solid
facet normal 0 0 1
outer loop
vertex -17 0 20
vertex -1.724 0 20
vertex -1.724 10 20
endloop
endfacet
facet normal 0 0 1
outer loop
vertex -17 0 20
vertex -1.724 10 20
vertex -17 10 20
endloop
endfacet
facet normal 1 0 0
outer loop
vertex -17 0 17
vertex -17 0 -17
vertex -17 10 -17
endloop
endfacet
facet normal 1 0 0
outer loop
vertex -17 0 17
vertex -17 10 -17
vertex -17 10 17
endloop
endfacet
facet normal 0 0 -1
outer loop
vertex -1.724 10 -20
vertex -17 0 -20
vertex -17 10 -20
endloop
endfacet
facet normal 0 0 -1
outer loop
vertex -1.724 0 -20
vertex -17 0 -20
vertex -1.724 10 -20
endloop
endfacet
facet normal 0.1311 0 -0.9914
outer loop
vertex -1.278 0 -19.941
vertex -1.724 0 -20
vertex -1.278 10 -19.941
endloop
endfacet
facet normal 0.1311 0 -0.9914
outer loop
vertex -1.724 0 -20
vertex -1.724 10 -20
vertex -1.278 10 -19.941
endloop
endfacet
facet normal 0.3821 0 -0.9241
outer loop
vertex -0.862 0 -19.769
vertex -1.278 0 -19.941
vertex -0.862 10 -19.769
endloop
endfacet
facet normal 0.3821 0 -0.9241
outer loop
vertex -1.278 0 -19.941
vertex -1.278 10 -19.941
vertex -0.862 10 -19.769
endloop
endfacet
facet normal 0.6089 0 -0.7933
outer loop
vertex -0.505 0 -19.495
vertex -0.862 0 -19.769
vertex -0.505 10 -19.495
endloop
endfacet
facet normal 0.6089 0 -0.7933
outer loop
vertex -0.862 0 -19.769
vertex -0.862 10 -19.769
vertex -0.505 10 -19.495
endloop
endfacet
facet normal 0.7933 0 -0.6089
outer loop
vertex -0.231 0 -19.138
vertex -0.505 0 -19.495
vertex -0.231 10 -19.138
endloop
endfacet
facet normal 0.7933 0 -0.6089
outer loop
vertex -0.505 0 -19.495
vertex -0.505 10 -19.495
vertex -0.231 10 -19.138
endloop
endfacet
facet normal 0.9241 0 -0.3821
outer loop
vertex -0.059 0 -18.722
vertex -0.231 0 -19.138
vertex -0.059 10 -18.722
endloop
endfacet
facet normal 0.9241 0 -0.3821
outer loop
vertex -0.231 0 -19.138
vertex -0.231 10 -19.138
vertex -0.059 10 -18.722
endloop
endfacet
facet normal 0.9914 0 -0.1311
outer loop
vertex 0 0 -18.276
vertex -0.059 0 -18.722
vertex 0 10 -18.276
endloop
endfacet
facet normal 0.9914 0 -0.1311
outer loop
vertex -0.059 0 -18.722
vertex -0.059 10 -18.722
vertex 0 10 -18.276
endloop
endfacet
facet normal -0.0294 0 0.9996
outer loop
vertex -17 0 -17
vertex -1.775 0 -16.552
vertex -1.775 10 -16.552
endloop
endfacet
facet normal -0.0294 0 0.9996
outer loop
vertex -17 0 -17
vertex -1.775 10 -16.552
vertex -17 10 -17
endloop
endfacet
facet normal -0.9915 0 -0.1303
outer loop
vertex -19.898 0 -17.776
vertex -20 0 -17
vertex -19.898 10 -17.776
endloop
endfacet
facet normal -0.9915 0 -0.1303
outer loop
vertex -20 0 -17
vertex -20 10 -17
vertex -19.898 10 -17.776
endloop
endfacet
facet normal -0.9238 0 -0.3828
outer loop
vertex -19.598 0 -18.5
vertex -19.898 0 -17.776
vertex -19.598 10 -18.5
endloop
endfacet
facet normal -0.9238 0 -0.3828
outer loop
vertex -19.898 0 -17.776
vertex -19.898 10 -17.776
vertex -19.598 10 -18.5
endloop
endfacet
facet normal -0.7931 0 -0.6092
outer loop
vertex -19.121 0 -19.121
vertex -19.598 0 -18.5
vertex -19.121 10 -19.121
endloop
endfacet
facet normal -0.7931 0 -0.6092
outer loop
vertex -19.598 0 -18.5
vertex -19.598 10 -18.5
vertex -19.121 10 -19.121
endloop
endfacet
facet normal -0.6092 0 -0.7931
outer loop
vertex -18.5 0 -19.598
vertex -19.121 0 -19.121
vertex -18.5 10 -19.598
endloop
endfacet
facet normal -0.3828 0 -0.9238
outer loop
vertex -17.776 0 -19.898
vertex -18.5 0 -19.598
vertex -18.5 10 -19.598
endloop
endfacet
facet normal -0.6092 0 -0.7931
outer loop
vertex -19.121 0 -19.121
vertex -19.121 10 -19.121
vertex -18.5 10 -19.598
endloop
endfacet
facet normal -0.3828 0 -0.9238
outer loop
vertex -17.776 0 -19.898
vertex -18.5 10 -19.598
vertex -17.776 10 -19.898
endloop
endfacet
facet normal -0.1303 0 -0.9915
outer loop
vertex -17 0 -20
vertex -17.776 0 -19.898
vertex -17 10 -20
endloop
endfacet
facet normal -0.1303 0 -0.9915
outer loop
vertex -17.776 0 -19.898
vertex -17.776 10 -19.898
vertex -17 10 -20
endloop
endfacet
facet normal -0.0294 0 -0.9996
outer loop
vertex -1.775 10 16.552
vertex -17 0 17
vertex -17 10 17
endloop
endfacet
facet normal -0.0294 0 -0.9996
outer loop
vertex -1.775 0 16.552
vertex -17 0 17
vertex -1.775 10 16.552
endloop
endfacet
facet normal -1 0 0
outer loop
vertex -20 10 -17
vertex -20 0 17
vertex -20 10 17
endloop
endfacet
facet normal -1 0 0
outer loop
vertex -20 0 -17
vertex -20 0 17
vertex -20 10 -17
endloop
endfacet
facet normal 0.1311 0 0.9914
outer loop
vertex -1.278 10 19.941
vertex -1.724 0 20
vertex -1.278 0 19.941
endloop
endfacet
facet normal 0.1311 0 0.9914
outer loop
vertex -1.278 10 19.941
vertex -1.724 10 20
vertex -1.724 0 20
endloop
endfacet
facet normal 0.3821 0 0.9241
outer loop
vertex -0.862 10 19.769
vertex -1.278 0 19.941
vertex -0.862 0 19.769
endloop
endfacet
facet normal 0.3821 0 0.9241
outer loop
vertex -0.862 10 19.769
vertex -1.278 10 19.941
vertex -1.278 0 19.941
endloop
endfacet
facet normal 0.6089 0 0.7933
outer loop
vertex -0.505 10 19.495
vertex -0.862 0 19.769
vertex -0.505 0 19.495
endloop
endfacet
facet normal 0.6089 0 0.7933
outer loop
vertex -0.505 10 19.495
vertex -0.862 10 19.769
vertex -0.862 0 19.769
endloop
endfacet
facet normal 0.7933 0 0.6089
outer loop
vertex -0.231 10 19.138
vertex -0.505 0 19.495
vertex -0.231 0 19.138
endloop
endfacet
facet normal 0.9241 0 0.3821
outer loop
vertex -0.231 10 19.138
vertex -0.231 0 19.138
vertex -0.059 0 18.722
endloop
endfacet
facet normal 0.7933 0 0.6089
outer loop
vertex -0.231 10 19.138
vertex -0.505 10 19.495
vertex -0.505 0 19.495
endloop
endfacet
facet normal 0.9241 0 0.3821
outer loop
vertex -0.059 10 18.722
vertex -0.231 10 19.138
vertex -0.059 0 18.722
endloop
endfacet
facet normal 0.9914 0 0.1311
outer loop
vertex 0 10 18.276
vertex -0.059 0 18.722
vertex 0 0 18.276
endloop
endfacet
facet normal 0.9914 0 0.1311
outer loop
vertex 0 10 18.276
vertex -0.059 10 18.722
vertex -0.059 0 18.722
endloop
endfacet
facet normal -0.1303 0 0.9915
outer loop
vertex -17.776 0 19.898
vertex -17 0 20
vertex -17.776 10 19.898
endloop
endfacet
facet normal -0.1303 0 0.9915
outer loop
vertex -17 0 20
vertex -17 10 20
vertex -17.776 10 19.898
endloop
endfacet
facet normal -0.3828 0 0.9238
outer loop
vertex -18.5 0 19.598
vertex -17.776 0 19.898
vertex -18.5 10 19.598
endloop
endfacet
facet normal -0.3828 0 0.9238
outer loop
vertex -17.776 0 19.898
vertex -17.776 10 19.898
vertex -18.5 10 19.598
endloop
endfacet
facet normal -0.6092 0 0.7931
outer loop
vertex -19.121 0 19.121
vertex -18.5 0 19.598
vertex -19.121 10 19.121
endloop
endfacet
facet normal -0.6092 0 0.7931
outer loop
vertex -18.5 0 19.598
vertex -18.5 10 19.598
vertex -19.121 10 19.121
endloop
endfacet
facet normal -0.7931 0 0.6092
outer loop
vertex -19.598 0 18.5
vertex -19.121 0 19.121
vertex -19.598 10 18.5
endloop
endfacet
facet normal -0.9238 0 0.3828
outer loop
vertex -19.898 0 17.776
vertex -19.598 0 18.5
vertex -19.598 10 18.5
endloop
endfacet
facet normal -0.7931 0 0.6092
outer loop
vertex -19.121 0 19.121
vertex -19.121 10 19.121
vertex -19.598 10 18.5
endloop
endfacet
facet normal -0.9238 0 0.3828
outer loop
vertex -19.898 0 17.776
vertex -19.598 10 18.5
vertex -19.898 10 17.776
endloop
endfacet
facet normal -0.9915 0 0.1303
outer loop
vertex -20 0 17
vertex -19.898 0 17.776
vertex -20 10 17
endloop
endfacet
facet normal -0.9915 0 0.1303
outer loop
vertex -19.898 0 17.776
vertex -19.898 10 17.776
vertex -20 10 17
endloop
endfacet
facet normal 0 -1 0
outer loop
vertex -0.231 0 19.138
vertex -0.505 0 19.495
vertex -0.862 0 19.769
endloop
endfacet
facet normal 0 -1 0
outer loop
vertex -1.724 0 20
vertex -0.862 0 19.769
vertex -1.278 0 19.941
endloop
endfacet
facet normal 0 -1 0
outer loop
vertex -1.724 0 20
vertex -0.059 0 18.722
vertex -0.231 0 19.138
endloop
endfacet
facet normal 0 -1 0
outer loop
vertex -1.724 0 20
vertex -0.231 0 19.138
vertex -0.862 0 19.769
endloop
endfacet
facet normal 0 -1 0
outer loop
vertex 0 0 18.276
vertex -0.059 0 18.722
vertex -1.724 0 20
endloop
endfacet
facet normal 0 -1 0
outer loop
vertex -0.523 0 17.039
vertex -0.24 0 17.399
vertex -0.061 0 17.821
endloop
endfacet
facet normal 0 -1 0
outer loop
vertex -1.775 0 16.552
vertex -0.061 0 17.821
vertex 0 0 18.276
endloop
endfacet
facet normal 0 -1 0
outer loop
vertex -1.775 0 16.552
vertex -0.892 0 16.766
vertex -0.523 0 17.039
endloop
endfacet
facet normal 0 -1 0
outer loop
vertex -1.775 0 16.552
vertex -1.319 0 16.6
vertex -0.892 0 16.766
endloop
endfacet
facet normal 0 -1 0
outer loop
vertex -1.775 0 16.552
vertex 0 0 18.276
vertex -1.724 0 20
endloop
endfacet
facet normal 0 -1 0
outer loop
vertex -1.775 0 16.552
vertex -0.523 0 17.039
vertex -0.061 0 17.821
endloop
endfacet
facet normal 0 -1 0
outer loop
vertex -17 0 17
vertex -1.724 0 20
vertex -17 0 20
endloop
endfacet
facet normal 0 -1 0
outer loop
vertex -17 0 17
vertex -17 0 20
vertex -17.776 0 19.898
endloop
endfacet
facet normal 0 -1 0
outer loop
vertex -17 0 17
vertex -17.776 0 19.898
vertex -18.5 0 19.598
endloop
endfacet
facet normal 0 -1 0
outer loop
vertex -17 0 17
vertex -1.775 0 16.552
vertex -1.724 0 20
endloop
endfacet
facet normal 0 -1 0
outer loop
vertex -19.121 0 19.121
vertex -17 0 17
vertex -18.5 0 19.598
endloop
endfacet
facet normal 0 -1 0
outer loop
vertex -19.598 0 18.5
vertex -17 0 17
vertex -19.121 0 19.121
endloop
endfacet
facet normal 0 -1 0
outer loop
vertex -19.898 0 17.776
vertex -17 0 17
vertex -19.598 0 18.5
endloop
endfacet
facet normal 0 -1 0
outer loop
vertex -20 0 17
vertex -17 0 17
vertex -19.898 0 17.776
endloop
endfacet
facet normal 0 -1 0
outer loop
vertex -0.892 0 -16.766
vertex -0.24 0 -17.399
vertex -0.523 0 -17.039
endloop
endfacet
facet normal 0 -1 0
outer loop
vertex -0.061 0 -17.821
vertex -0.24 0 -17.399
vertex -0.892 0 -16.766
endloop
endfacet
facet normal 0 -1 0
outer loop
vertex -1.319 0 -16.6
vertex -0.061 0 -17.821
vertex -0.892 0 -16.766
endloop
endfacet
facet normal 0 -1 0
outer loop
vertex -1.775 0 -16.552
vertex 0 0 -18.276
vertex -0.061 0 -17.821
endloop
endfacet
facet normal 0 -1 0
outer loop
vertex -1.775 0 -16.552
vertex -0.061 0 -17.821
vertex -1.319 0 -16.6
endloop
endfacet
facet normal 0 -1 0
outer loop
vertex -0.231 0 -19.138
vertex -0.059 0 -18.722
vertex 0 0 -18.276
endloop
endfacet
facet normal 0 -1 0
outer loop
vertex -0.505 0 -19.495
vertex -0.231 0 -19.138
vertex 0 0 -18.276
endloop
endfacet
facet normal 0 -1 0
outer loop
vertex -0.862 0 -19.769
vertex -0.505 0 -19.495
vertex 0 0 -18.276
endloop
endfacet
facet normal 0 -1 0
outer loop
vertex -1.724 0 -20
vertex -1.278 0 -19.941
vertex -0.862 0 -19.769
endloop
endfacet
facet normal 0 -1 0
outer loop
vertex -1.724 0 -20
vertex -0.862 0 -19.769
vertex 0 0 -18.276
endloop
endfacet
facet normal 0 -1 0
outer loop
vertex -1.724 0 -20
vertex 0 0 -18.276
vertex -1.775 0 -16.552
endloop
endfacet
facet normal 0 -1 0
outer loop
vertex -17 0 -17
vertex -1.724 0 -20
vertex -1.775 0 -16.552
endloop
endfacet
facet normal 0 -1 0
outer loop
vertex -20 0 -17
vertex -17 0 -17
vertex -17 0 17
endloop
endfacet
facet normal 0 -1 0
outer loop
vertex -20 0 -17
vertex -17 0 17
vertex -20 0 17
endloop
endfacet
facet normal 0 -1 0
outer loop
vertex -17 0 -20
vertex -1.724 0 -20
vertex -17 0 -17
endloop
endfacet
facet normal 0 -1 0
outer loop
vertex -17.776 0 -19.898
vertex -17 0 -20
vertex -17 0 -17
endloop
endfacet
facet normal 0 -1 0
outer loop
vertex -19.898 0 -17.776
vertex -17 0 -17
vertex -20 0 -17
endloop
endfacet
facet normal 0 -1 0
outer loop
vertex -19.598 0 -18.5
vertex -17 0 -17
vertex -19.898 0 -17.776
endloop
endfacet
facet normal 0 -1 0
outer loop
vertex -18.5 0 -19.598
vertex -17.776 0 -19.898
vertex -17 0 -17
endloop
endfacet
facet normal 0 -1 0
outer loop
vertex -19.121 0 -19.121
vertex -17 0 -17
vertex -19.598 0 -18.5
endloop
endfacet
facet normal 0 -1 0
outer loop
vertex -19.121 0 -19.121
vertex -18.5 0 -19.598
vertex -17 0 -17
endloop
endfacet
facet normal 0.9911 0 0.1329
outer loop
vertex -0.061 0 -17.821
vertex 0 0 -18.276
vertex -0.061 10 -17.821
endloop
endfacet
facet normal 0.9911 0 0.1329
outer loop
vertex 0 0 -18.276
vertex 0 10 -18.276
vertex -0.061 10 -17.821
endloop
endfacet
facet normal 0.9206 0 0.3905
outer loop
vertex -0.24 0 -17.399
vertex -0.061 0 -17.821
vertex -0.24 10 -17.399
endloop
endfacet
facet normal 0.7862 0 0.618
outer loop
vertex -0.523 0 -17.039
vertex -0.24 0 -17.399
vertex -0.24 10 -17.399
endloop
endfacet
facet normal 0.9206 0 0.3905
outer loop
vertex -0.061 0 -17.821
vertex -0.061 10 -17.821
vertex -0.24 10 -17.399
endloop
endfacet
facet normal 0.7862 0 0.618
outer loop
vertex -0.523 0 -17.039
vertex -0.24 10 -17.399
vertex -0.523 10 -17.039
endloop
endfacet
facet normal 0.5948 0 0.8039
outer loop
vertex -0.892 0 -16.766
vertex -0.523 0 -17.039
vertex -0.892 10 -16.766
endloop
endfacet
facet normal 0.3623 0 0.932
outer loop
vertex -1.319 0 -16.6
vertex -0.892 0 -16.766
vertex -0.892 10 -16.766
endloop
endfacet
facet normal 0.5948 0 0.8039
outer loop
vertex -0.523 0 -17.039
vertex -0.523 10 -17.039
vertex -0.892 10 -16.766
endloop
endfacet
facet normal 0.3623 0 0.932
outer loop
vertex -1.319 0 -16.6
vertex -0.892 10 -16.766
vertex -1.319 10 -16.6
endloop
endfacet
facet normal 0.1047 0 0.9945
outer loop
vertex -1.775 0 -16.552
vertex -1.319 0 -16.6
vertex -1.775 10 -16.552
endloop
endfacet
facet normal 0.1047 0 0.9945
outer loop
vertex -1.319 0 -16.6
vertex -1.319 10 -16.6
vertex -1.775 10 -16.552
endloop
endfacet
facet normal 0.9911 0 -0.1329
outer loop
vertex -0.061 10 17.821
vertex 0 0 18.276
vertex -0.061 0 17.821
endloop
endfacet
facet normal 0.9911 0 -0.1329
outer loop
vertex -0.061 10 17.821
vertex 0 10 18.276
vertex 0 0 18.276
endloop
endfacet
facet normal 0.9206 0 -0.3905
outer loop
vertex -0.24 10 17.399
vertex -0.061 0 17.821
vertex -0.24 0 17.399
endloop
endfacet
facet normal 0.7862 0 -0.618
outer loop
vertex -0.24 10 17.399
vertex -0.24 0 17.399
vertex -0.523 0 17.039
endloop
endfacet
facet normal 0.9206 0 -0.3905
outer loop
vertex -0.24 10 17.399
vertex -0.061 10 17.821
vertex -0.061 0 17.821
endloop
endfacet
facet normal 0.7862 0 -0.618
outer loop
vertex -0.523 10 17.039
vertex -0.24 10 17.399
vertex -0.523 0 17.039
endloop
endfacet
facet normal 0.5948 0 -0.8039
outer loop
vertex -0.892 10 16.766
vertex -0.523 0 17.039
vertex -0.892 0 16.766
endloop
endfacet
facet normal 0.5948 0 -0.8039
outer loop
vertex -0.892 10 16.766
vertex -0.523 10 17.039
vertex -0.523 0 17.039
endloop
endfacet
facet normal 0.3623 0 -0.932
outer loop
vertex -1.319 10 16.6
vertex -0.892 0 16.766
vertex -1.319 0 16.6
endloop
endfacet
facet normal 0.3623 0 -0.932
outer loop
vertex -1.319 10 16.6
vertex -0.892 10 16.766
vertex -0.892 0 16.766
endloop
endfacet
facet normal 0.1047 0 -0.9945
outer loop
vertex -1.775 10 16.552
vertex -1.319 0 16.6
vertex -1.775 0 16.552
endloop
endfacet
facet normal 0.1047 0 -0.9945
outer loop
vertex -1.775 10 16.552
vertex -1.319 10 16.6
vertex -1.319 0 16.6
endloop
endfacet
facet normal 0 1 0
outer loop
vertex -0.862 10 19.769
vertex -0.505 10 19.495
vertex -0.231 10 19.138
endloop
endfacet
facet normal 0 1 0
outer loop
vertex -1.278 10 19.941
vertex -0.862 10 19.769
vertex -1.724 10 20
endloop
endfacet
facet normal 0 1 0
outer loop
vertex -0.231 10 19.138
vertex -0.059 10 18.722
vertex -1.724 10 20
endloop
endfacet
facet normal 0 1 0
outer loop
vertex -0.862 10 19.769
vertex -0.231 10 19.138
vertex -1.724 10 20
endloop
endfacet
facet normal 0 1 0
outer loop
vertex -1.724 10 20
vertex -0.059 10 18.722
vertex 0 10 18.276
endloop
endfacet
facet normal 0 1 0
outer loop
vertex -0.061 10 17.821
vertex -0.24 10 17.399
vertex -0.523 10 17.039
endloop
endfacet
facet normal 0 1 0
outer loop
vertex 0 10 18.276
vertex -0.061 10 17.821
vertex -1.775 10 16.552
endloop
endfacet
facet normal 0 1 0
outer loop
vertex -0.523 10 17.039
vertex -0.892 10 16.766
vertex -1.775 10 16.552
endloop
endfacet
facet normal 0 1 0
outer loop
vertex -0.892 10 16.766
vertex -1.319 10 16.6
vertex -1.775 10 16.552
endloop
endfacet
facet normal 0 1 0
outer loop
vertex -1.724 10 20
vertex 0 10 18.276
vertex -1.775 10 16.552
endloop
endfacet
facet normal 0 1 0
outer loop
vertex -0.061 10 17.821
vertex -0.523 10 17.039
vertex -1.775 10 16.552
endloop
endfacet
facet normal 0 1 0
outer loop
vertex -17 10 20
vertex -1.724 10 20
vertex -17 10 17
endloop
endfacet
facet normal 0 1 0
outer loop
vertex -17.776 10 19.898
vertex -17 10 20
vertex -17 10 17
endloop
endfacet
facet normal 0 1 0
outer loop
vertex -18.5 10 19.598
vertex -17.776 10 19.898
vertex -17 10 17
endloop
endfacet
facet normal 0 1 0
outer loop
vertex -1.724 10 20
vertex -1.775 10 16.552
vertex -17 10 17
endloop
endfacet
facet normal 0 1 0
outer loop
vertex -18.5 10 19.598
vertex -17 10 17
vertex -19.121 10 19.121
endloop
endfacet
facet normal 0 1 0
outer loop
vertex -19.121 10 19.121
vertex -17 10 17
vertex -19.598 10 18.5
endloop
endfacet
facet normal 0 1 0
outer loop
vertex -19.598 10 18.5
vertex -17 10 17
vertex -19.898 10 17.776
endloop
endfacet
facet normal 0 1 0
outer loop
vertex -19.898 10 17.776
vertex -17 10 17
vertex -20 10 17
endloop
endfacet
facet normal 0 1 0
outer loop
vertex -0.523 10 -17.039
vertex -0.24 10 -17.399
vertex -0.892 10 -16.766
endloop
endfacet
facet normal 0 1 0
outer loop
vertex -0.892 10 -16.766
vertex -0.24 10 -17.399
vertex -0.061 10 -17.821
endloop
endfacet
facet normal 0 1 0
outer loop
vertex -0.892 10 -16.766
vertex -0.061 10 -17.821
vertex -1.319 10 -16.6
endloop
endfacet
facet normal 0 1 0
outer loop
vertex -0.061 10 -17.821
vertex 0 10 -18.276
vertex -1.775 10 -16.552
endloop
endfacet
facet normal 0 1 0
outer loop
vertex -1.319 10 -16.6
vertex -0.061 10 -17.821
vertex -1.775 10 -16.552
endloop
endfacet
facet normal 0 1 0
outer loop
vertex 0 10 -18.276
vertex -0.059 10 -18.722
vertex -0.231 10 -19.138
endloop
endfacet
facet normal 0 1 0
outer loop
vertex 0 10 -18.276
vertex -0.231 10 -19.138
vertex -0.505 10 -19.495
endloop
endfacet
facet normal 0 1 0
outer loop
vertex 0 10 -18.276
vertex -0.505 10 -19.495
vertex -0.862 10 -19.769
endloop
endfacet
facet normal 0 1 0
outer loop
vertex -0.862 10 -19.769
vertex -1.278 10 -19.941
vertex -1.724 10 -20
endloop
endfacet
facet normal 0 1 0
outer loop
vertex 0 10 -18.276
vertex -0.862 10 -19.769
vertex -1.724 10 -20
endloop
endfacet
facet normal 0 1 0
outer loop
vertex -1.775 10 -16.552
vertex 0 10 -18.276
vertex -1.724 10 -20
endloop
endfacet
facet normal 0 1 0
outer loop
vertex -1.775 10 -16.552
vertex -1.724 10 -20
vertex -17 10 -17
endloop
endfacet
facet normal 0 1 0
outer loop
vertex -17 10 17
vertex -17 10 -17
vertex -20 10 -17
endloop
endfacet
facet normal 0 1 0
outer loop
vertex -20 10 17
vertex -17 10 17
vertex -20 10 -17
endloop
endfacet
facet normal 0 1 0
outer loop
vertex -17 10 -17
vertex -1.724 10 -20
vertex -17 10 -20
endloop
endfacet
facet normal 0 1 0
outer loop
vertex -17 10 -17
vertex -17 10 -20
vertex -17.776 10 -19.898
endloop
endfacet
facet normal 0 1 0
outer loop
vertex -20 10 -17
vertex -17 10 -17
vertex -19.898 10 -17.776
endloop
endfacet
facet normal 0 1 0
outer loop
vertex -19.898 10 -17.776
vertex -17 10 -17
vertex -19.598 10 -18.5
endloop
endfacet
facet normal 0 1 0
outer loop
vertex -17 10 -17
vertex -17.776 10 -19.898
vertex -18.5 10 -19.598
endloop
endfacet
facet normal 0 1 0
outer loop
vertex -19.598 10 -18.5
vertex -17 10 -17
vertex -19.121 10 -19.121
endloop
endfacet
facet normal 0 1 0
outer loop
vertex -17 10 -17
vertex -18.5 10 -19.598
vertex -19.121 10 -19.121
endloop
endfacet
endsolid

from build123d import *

# Parameters (mm, degrees)
BOSS_EXTRUDE1_DEPTH = 10
FILLET1_R           = 3
FILLET2_R           = 1.72427
FILLET3_R           = 1.72427


with BuildPart() as part:
    # Sketch1 → Boss-Extrude1 (new body)
    with BuildSketch(Plane(origin=(0, 0, 0), x_dir=(1, 0, 0), z_dir=(0, 1, 0))):
        Polygon((0, -16.5), (0, -20), (-20, -20), (-20, 20), (0, 20), (0, 16.5), (-17, 17), (-17, -17), align=None)
    extrude(amount=BOSS_EXTRUDE1_DEPTH)

    # Fillet1
    fillet1_edges = [part.edges().sort_by_distance(p)[0] for p in [
        (-20, 5, -20),
        (-20, 5, 20),
    ]]
    fillet(fillet1_edges, radius=FILLET1_R)

    # Fillet2
    fillet2_edges = [part.edges().sort_by_distance(p)[0] for p in [
        (0, 5, 16.5),
        (0, 5, 20),
    ]]
    fillet(fillet2_edges, radius=FILLET2_R)

    # Fillet3
    fillet3_edges = [part.edges().sort_by_distance(p)[0] for p in [
        (0, 5, -20),
        (0, 5, -16.5),
    ]]
    fillet(fillet3_edges, radius=FILLET3_R)


solid = part.part
